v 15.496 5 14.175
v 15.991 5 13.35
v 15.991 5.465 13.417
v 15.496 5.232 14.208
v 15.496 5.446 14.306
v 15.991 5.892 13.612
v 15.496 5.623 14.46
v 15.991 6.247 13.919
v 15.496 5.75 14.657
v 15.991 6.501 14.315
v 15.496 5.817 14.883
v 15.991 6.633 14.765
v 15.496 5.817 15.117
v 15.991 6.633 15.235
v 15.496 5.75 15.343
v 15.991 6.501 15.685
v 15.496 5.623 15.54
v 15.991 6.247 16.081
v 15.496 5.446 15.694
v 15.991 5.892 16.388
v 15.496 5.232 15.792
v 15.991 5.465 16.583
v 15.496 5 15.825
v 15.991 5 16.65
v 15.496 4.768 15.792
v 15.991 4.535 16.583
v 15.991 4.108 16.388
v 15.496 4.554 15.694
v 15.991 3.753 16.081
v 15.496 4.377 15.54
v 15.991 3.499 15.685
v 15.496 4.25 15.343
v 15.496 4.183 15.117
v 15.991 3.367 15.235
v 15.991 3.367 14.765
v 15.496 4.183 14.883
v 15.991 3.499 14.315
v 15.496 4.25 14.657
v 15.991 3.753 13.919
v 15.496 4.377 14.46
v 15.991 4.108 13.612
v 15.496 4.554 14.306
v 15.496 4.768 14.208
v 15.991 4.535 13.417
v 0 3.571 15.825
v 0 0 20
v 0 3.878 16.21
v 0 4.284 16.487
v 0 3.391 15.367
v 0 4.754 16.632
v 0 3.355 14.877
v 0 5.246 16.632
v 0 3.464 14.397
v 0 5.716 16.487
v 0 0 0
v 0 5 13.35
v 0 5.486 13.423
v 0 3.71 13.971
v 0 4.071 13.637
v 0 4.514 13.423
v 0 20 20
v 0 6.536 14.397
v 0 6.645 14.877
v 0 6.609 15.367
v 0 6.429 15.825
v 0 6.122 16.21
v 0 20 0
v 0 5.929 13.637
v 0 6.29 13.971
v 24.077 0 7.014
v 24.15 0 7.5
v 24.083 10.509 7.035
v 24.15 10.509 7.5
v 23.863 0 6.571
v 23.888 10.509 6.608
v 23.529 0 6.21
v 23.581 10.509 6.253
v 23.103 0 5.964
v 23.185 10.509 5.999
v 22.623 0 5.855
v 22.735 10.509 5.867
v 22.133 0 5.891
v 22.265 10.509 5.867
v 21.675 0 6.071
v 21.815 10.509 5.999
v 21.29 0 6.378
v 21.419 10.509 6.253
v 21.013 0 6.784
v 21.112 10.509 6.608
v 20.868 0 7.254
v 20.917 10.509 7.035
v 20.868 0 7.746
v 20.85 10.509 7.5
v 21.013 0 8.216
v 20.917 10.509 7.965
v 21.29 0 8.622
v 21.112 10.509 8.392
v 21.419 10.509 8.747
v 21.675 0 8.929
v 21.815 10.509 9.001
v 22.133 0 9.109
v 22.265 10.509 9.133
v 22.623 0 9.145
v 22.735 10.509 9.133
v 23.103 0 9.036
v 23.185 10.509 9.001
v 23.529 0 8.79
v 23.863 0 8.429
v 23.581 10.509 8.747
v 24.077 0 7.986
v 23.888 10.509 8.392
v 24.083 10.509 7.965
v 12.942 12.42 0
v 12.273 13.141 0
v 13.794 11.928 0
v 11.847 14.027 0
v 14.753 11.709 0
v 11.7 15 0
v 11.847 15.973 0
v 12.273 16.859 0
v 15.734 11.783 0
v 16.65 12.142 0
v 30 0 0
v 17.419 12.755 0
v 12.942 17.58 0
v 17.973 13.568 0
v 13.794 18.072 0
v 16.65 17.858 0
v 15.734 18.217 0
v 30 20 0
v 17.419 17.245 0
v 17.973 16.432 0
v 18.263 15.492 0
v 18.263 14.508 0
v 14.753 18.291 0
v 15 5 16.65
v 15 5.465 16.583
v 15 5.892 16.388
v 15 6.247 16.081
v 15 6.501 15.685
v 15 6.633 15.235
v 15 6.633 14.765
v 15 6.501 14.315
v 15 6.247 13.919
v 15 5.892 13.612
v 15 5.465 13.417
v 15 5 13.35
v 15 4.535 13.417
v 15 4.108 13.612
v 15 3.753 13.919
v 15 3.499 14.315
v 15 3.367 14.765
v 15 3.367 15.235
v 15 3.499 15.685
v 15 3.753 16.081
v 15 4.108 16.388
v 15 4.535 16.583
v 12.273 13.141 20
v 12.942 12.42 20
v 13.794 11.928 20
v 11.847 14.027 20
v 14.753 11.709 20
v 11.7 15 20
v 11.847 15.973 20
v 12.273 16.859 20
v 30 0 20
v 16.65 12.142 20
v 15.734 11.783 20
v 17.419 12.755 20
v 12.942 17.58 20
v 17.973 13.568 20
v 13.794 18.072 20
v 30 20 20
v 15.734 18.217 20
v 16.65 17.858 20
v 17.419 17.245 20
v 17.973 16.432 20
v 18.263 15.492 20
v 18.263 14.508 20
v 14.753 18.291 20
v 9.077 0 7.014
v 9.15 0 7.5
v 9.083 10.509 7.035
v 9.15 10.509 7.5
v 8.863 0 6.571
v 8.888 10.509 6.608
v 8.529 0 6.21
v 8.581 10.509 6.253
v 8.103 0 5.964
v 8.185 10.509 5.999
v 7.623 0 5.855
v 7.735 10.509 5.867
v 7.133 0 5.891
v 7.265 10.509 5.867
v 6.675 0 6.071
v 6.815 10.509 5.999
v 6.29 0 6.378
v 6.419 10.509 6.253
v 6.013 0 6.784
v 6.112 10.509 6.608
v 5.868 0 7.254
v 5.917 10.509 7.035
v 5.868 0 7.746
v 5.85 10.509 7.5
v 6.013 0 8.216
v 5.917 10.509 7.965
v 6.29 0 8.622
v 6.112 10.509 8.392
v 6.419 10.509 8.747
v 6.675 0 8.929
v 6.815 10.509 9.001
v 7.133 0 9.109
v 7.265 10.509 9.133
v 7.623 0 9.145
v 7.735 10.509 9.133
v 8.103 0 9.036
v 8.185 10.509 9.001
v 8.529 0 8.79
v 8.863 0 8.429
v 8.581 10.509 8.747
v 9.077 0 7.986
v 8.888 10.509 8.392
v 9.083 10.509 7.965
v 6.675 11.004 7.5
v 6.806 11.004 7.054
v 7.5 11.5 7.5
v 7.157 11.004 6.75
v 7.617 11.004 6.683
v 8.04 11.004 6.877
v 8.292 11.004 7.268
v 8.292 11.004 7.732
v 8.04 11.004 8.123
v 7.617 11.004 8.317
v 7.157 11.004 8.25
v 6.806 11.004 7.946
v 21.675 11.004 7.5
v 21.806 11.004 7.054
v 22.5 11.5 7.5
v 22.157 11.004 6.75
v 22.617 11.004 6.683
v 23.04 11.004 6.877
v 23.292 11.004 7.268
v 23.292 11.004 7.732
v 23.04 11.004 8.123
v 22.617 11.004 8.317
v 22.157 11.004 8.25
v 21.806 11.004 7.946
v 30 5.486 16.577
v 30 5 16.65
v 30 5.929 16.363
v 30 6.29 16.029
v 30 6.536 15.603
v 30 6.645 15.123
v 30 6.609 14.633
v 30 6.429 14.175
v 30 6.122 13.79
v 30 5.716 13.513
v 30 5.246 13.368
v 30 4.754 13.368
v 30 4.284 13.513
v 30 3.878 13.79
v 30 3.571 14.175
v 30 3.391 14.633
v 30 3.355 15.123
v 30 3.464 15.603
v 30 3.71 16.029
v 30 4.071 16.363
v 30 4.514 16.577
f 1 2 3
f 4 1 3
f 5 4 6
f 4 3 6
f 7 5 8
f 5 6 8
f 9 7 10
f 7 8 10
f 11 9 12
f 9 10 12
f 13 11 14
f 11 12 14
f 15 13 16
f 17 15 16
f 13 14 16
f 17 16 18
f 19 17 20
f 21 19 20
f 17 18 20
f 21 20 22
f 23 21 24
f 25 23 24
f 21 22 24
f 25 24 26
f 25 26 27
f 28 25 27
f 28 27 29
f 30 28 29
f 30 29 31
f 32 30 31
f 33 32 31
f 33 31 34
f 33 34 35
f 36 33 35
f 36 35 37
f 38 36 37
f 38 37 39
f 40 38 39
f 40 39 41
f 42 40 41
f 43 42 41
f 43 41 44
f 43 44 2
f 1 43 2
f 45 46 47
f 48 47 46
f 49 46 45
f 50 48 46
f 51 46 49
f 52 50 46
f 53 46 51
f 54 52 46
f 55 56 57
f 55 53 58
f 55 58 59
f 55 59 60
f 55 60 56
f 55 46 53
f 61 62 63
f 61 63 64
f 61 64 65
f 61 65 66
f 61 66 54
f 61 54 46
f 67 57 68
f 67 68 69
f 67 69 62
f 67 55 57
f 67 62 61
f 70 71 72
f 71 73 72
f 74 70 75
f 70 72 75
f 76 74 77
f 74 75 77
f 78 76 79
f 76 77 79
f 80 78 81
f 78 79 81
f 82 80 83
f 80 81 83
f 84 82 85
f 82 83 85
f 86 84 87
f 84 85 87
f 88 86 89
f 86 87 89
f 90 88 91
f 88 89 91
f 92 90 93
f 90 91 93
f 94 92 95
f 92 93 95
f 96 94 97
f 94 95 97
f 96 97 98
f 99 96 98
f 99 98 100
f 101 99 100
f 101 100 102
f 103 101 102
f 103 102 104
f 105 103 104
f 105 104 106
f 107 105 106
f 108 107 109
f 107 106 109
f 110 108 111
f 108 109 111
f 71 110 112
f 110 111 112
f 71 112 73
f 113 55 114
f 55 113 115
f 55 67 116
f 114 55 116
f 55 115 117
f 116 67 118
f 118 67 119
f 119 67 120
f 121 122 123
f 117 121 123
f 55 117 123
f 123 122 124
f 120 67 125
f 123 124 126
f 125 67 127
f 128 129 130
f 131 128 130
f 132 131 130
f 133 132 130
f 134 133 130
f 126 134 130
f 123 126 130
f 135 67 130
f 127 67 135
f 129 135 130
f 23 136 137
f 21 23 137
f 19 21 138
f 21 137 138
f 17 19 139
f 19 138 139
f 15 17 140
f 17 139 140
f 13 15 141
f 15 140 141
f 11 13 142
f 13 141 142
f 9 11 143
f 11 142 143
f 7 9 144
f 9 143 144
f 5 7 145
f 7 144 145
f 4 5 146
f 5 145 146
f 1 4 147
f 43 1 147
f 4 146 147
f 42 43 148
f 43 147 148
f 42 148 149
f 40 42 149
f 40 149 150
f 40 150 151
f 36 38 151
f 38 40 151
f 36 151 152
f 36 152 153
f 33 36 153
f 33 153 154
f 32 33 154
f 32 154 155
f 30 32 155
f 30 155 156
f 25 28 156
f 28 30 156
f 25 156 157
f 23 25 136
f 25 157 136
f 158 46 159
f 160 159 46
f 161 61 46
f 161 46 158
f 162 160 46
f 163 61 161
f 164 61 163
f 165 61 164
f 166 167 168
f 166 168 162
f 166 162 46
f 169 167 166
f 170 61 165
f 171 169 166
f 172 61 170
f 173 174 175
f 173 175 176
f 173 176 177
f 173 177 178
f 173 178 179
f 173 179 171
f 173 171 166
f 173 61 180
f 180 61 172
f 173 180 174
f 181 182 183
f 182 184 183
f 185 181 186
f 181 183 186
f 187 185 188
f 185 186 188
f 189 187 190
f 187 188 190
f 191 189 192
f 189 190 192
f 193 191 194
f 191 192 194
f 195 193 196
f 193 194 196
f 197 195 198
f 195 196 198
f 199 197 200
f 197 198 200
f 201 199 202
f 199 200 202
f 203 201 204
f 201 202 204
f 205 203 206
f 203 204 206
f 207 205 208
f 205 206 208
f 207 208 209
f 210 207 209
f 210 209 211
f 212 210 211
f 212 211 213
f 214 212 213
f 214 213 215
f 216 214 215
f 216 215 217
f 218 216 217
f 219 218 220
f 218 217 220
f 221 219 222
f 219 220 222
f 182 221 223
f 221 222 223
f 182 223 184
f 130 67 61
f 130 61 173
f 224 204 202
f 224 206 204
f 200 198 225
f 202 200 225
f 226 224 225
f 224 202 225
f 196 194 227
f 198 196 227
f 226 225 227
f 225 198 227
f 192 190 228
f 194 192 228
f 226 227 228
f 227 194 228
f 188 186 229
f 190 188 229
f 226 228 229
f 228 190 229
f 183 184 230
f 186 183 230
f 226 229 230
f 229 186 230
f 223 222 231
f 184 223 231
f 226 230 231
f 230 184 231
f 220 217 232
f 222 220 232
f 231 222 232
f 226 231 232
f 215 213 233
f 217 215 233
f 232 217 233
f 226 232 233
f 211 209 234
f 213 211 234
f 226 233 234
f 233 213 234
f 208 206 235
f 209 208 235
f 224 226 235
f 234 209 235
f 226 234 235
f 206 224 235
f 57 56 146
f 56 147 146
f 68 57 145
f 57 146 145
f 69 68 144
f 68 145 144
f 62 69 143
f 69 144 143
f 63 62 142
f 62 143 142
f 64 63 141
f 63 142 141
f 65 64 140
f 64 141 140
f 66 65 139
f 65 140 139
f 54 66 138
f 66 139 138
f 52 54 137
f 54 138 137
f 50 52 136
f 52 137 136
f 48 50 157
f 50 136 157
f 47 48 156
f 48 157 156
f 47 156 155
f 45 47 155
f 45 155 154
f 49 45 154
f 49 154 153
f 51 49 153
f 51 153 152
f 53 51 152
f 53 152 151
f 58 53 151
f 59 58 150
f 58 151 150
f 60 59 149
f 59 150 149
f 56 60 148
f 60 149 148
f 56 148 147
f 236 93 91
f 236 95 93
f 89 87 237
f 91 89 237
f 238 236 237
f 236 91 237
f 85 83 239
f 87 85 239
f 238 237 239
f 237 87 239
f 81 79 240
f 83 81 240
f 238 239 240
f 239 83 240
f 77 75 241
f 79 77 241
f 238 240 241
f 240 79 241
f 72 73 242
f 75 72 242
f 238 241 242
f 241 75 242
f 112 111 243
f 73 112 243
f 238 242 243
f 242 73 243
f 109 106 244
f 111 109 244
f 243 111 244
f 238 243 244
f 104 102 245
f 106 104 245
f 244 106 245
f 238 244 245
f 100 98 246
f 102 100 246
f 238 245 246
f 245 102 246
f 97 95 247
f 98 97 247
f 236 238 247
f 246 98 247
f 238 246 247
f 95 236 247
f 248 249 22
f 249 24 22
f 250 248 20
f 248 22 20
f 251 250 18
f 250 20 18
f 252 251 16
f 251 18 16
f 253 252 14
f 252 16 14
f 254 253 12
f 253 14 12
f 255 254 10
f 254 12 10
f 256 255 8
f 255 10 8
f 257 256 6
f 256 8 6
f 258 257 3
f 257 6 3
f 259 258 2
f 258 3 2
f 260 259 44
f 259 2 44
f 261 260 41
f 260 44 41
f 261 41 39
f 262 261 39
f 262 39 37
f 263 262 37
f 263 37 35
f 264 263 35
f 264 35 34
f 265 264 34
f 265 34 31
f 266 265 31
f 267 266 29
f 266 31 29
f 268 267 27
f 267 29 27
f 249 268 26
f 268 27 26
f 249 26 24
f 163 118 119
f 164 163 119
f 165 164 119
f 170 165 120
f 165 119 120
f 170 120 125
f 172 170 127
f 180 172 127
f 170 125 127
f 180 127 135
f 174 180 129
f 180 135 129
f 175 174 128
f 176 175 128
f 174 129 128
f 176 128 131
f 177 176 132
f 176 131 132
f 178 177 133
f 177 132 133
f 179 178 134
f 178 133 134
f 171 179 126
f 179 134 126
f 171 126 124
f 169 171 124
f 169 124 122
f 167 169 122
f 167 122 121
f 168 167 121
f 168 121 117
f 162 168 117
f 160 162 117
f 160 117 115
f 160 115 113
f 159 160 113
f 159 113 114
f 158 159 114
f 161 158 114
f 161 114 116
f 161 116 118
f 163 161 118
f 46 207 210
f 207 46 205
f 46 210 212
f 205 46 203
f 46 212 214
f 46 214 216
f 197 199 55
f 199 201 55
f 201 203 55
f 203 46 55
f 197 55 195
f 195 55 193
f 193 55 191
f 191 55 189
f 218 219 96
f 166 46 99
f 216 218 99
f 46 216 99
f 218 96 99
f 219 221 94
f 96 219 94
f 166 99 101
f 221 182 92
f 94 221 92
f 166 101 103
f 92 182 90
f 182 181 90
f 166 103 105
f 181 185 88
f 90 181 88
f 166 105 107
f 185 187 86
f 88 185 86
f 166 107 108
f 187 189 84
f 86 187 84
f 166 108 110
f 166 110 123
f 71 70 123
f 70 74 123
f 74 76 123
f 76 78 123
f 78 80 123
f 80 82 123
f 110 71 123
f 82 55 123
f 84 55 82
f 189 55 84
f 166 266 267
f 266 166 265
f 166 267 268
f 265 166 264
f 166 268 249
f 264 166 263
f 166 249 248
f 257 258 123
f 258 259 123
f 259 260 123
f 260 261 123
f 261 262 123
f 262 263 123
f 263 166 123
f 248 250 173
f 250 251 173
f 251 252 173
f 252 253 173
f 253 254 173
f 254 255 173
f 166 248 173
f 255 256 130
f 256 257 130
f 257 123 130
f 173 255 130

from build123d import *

# Parameters (mm, degrees)
SKIZZE1_W                       = 30
SKIZZE1_H                       = 20
AUFSATZ_LINEAR_AUSTRAGEN1_DEPTH = 20
M6_GEWINDEBOHRUNG_D             = 3.3
M6_GEWINDEBOHRUNG_DEPTH         = 10.508579979
M6_GEWINDEBOHRUNG_TIP           = 0.991420021
DURCHGANGSLOCH_F_R_M61_D        = 6.6
M4_GEWINDEBOHRUNG1_D            = 3.3
M4_GEWINDEBOHRUNG1_DEPTH        = 14.008579979
M4_GEWINDEBOHRUNG1_TIP          = 0.991420021
M4_GEWINDEBOHRUNG2_D            = 3.3
M4_GEWINDEBOHRUNG2_DEPTH        = 15
M4_GEWINDEBOHRUNG2_TIP          = 0.991420021


with BuildPart() as part:
    # Skizze1 → Aufsatz-Linear austragen1 (new body)
    with BuildSketch(Plane.XY):
        with Locations((15, 10)):
            Rectangle(SKIZZE1_W, SKIZZE1_H)
    extrude(amount=AUFSATZ_LINEAR_AUSTRAGEN1_DEPTH)

    # M6 Gewindebohrung
    with Locations(Plane(origin=(0, 0, 0), x_dir=(-1, 0, 0), z_dir=(0, -1, 0))):
        with Locations((-22.5, -7.5), (-7.5, -7.5)):
            Hole(M6_GEWINDEBOHRUNG_D / 2, depth=M6_GEWINDEBOHRUNG_DEPTH)
            with Locations((0, 0, -(M6_GEWINDEBOHRUNG_DEPTH + M6_GEWINDEBOHRUNG_TIP / 2))):  # 118° drill point
                Cone(0, M6_GEWINDEBOHRUNG_D / 2, M6_GEWINDEBOHRUNG_TIP, mode=Mode.SUBTRACT)

    # Durchgangsloch für M61 (through all)
    with Locations(Plane.XY.offset(20)):
        with Locations((15, 15)):
            Hole(DURCHGANGSLOCH_F_R_M61_D / 2)

    # M4 Gewindebohrung1
    with Locations(Plane(origin=(30, 0, 0), x_dir=(0, 0, -1), z_dir=(1, 0, 0))):
        with Locations((-15, 5)):
            Hole(M4_GEWINDEBOHRUNG1_D / 2, depth=M4_GEWINDEBOHRUNG1_DEPTH)
            with Locations((0, 0, -(M4_GEWINDEBOHRUNG1_DEPTH + M4_GEWINDEBOHRUNG1_TIP / 2))):  # 118° drill point
                Cone(0, M4_GEWINDEBOHRUNG1_D / 2, M4_GEWINDEBOHRUNG1_TIP, mode=Mode.SUBTRACT)

    # M4 Gewindebohrung2
    with Locations(Plane.ZY):
        with Locations((15, 5)):
            Hole(M4_GEWINDEBOHRUNG2_D / 2, depth=M4_GEWINDEBOHRUNG2_DEPTH)
            with Locations((0, 0, -(M4_GEWINDEBOHRUNG2_DEPTH + M4_GEWINDEBOHRUNG2_TIP / 2))):  # 118° drill point
                Cone(0, M4_GEWINDEBOHRUNG2_D / 2, M4_GEWINDEBOHRUNG2_TIP, mode=Mode.SUBTRACT)


solid = part.part
